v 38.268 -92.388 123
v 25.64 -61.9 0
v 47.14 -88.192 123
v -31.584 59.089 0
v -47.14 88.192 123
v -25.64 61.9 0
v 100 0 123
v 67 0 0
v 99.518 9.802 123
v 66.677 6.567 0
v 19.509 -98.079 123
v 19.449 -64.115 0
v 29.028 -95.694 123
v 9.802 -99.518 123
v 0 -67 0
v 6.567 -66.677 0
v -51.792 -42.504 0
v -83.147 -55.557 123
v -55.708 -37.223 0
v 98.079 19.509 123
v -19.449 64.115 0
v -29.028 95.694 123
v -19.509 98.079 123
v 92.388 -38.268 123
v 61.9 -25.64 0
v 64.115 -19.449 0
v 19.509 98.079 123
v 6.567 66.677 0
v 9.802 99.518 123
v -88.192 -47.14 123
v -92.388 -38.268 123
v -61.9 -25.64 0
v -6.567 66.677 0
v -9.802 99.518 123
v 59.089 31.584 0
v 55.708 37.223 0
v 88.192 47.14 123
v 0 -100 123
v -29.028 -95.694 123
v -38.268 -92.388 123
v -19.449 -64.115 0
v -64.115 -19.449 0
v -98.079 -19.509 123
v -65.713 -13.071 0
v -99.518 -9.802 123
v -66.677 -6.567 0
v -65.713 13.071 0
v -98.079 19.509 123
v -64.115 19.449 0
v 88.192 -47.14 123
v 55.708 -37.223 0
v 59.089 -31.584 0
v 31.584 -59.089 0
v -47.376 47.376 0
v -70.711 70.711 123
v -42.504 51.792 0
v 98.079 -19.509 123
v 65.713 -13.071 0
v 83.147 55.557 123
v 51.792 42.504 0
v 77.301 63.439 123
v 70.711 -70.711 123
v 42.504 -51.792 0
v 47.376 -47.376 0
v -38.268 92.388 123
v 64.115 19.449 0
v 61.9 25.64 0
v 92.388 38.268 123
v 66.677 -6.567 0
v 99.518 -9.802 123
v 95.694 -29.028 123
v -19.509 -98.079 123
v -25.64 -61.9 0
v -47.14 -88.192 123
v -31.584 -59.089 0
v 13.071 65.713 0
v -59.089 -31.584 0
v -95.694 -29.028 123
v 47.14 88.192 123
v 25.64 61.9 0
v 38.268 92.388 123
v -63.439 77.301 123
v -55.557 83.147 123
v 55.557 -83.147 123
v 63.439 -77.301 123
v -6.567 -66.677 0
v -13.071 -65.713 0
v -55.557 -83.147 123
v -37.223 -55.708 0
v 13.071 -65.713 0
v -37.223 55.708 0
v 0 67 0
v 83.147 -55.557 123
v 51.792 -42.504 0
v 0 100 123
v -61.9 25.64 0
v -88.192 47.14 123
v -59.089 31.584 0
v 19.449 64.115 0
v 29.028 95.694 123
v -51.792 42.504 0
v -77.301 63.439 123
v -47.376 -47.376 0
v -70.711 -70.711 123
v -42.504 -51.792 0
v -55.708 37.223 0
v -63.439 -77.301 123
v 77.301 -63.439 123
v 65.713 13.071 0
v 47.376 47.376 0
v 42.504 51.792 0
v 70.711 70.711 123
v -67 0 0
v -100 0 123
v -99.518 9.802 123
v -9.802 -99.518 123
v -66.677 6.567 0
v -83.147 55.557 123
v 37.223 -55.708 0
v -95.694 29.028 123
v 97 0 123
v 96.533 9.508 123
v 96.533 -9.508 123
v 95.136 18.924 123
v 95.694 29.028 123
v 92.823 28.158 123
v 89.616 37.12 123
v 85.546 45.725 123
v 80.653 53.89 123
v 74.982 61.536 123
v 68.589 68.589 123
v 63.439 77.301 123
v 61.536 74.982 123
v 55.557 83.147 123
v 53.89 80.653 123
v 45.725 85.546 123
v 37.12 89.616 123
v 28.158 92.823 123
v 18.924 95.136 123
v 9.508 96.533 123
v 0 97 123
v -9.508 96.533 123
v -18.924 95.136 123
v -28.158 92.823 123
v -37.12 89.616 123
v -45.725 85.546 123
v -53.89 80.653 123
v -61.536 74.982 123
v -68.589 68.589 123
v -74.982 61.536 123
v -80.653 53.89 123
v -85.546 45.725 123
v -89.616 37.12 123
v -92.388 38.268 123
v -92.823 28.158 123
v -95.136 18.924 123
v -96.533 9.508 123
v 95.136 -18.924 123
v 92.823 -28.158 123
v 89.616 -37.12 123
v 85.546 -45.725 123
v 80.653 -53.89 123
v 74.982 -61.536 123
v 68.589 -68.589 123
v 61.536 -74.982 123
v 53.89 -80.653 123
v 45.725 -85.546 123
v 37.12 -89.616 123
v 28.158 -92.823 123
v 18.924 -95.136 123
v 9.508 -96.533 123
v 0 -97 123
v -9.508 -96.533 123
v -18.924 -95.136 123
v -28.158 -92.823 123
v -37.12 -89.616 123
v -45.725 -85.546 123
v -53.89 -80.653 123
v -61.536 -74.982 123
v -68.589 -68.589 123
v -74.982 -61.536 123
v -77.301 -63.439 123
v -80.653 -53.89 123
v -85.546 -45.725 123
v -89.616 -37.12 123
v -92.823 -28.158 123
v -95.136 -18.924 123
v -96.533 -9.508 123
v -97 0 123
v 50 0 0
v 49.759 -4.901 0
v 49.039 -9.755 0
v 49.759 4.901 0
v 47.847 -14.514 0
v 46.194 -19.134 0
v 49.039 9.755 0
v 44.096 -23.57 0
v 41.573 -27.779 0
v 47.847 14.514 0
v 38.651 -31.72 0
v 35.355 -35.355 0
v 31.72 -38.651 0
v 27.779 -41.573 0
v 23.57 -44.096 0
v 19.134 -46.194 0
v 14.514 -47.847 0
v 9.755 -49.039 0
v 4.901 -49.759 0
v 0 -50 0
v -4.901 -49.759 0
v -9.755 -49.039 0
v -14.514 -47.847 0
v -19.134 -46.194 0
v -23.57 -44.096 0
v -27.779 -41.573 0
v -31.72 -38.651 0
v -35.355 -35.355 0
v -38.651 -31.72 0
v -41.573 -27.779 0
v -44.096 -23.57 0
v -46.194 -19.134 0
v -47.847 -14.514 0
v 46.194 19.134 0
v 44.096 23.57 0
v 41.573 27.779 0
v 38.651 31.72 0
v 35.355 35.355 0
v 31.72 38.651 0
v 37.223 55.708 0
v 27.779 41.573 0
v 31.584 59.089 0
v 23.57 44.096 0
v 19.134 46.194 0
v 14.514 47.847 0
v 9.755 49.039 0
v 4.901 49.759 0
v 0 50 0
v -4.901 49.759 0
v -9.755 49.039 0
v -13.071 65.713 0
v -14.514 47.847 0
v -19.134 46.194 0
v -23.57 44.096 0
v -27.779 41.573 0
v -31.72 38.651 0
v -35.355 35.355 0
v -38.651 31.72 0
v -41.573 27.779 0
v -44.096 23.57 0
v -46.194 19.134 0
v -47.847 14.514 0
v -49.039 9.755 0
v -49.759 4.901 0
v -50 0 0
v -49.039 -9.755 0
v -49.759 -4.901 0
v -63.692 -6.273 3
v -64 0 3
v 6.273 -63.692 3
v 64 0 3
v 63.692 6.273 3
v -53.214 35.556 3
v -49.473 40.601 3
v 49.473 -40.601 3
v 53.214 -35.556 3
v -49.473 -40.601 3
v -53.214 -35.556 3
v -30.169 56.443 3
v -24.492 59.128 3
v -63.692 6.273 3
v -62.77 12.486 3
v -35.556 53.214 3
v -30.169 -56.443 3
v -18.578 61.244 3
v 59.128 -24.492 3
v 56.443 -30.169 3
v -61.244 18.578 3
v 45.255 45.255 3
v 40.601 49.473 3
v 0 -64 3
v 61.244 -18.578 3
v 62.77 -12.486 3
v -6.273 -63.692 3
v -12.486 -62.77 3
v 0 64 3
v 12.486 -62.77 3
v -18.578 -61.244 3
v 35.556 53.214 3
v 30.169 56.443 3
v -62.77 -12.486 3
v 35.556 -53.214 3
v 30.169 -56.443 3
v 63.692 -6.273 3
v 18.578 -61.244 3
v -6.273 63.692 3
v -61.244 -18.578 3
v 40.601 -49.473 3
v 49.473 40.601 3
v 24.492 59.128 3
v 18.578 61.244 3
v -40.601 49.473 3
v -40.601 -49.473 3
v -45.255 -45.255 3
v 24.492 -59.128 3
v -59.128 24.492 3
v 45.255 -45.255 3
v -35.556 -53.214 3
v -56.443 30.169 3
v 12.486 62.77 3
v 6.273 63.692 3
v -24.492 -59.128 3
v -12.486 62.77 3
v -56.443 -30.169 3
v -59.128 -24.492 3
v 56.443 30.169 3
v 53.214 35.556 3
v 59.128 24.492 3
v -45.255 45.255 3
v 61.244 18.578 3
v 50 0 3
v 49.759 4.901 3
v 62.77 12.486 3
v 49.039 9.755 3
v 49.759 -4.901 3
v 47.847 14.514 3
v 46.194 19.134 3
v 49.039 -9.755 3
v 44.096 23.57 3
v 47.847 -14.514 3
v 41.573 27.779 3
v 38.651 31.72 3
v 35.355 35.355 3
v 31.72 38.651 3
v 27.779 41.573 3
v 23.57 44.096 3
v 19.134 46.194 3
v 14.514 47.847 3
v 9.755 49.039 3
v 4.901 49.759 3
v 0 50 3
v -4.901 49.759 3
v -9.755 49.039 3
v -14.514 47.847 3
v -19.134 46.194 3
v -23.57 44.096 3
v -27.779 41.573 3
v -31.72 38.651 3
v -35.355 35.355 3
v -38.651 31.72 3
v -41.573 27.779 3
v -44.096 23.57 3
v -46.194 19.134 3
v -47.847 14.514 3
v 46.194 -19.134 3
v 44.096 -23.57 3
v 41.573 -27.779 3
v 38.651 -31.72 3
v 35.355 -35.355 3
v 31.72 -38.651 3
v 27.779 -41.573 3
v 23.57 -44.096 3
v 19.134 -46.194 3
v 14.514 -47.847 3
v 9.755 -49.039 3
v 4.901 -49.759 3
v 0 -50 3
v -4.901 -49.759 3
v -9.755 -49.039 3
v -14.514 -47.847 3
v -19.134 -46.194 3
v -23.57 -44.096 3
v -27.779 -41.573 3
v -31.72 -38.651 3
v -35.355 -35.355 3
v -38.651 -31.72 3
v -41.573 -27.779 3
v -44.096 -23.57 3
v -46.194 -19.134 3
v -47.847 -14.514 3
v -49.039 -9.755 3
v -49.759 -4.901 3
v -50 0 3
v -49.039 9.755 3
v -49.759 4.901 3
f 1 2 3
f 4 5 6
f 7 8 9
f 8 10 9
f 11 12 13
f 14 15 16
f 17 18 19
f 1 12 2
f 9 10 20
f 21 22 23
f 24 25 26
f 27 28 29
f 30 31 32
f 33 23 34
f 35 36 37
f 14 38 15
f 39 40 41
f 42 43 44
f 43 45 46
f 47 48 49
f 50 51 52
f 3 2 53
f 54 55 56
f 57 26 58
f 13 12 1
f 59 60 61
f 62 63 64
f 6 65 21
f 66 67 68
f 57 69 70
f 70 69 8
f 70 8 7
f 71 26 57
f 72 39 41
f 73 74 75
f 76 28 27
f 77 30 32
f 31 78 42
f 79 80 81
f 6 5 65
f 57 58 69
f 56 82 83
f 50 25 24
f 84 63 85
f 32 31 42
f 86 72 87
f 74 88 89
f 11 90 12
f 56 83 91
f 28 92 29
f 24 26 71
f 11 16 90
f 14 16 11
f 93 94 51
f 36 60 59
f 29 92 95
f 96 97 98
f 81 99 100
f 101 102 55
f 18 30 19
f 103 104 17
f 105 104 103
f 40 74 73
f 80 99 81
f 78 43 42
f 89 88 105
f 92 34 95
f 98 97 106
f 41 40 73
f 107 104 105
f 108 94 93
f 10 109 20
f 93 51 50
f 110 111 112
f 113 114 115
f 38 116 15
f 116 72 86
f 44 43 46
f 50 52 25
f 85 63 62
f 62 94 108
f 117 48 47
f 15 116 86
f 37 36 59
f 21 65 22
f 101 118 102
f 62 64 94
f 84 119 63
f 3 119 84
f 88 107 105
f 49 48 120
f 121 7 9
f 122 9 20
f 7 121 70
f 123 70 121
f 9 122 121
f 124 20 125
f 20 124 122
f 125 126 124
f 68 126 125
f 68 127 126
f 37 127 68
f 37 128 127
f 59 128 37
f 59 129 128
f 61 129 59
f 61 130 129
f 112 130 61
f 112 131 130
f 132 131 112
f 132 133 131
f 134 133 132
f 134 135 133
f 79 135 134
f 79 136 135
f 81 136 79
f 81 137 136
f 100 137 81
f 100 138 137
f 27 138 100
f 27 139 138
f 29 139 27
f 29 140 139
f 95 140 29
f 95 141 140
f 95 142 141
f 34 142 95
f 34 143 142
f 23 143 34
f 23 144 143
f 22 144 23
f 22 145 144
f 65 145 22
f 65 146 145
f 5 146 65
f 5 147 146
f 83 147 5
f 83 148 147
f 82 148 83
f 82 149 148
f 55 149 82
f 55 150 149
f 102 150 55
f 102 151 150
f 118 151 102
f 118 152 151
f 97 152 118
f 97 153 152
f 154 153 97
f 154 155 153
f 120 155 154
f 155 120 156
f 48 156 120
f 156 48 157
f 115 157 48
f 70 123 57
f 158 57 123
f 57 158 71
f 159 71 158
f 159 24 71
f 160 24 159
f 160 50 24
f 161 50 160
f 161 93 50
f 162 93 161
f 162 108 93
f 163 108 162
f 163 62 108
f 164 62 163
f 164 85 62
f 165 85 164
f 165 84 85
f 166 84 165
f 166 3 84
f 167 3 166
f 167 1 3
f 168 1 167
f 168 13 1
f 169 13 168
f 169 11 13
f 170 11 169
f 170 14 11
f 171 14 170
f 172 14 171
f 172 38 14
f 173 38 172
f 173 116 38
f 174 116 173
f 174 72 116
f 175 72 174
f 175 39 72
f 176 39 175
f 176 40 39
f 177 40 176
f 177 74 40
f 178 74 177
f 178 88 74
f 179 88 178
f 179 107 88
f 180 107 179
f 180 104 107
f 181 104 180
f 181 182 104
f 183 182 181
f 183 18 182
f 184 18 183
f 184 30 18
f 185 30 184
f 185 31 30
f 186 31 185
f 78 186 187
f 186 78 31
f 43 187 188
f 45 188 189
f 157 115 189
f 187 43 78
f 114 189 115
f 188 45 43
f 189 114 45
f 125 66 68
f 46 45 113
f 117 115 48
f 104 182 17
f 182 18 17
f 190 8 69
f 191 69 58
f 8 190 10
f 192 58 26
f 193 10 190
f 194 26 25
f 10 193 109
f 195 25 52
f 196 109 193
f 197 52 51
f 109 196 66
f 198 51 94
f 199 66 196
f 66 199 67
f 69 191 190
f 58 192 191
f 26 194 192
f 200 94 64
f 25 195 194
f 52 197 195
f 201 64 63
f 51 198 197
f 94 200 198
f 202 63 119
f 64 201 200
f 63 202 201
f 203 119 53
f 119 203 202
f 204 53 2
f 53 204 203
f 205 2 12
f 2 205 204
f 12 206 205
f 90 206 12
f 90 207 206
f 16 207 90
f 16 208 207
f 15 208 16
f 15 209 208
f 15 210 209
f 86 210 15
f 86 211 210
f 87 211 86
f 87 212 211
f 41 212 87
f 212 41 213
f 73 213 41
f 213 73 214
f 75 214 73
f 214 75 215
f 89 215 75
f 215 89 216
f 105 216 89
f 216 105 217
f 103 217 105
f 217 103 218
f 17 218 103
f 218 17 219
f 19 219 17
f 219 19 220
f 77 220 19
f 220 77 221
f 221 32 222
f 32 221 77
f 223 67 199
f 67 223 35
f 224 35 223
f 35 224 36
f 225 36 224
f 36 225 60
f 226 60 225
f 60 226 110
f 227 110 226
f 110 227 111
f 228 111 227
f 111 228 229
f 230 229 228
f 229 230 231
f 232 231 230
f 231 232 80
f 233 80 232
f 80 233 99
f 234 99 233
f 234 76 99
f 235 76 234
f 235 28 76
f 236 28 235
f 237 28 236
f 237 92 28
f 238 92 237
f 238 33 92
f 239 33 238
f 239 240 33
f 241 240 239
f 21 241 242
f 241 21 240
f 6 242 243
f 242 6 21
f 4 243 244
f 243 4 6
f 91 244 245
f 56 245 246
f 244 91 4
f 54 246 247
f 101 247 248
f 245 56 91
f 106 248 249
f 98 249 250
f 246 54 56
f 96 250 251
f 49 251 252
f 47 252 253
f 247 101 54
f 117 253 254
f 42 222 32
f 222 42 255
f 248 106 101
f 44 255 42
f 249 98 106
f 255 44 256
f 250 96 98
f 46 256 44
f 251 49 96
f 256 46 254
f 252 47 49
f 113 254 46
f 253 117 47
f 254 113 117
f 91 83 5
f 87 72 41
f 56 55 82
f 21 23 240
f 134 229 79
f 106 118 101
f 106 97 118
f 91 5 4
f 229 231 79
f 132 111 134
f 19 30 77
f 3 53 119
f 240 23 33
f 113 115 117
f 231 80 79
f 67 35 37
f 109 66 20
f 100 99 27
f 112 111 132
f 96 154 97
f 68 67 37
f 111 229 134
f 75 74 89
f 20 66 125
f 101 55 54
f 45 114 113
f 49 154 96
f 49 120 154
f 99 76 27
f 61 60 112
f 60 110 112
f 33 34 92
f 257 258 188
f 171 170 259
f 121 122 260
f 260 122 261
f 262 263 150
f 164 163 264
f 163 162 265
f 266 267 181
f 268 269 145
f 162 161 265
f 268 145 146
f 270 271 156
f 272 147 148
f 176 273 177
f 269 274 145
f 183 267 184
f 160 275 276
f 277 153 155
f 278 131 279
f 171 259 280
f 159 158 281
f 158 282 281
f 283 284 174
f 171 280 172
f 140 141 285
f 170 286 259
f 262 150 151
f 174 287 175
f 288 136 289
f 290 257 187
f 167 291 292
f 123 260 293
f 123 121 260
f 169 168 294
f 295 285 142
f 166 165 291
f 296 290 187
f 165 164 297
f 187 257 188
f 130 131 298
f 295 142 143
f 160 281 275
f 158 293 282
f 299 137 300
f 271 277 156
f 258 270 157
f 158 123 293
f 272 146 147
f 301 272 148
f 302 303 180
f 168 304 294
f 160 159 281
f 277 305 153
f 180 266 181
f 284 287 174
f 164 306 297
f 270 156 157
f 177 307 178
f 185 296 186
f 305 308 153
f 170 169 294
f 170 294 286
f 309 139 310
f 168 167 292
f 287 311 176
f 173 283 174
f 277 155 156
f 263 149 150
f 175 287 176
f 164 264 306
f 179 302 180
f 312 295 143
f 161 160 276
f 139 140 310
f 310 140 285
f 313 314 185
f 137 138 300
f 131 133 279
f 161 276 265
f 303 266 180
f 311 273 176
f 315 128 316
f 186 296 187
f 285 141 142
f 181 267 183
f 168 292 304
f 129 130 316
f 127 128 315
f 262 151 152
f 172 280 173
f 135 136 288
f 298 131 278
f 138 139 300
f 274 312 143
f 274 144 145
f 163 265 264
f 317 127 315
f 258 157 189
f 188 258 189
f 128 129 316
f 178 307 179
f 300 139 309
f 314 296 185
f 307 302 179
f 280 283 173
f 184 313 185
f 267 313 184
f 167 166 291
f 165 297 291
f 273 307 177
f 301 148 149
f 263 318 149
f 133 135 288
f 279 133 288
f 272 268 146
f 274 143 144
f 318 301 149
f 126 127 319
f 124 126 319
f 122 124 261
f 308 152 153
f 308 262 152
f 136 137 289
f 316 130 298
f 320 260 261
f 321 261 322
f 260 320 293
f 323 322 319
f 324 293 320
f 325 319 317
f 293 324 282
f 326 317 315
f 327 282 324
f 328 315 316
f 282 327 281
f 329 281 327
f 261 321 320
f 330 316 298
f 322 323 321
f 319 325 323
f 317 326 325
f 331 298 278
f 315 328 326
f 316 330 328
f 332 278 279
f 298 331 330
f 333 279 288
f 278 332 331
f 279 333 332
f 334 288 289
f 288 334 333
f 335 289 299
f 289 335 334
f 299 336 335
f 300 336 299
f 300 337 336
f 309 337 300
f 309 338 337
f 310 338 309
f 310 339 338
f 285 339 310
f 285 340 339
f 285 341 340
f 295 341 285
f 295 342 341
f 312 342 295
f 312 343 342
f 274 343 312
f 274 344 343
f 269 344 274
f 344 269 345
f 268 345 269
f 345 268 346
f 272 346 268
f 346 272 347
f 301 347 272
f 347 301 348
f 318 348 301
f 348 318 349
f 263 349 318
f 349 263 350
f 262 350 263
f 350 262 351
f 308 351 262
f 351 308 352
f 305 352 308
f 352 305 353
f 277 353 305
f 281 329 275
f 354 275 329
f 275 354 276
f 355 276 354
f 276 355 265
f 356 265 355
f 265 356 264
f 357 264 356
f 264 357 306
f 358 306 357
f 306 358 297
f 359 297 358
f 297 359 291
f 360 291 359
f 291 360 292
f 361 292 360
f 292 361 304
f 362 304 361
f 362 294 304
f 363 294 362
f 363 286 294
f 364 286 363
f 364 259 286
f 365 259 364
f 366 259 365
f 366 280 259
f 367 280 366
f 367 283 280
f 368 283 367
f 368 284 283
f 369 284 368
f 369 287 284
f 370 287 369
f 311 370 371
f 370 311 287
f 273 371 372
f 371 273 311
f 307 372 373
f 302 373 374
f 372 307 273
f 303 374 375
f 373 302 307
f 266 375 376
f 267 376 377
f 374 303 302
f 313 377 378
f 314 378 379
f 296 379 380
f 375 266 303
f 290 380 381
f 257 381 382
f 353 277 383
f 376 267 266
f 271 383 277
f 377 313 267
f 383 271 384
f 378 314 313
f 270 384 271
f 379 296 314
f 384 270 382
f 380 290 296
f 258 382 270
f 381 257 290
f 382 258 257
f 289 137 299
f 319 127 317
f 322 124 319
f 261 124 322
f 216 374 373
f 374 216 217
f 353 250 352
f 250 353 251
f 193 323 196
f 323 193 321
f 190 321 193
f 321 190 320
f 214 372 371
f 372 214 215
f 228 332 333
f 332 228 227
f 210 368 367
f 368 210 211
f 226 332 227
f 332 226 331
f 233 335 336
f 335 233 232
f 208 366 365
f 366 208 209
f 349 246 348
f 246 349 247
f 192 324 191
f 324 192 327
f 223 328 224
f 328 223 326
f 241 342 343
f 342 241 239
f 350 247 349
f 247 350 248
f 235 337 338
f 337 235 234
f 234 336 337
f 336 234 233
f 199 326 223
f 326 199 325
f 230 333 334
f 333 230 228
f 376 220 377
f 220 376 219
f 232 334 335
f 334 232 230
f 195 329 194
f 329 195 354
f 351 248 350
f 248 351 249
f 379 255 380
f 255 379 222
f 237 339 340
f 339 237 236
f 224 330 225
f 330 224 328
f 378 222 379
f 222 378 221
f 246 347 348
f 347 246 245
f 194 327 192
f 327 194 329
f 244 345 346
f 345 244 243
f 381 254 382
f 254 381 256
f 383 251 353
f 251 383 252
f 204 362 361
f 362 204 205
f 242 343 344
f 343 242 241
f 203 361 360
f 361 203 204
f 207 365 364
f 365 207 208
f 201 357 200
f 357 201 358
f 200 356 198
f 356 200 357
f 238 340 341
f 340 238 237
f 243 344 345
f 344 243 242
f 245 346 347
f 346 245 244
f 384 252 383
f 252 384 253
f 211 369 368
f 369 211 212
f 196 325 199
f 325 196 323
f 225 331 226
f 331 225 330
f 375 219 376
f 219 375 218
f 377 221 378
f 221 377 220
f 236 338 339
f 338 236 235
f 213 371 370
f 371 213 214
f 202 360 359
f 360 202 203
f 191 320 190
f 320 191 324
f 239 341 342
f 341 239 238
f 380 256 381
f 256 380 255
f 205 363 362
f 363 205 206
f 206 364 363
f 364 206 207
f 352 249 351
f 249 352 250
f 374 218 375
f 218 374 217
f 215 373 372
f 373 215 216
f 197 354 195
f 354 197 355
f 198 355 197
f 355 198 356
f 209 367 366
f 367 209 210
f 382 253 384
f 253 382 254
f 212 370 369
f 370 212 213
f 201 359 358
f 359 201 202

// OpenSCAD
$fn=64;

indre_d = 50;
ytre_d_bunn = 67;
ytre_d_topp = 100;
hoyde = 123;
tykkelse = 3;

//defaults: cylinder();  yields: cylinder($fn = 0, $fa = 12, $fs = 2, h = 1, r1 = 1, r2 = 1, center = false);
difference() {
    cylinder(h=hoyde, r1=ytre_d_bunn, r2=ytre_d_topp);
    translate([0,0,tykkelse]) {
        cylinder(h=hoyde-tykkelse, r1=ytre_d_bunn-tykkelse, r2=ytre_d_topp-tykkelse);
    }
    cylinder(h=tykkelse, r=indre_d);
}
